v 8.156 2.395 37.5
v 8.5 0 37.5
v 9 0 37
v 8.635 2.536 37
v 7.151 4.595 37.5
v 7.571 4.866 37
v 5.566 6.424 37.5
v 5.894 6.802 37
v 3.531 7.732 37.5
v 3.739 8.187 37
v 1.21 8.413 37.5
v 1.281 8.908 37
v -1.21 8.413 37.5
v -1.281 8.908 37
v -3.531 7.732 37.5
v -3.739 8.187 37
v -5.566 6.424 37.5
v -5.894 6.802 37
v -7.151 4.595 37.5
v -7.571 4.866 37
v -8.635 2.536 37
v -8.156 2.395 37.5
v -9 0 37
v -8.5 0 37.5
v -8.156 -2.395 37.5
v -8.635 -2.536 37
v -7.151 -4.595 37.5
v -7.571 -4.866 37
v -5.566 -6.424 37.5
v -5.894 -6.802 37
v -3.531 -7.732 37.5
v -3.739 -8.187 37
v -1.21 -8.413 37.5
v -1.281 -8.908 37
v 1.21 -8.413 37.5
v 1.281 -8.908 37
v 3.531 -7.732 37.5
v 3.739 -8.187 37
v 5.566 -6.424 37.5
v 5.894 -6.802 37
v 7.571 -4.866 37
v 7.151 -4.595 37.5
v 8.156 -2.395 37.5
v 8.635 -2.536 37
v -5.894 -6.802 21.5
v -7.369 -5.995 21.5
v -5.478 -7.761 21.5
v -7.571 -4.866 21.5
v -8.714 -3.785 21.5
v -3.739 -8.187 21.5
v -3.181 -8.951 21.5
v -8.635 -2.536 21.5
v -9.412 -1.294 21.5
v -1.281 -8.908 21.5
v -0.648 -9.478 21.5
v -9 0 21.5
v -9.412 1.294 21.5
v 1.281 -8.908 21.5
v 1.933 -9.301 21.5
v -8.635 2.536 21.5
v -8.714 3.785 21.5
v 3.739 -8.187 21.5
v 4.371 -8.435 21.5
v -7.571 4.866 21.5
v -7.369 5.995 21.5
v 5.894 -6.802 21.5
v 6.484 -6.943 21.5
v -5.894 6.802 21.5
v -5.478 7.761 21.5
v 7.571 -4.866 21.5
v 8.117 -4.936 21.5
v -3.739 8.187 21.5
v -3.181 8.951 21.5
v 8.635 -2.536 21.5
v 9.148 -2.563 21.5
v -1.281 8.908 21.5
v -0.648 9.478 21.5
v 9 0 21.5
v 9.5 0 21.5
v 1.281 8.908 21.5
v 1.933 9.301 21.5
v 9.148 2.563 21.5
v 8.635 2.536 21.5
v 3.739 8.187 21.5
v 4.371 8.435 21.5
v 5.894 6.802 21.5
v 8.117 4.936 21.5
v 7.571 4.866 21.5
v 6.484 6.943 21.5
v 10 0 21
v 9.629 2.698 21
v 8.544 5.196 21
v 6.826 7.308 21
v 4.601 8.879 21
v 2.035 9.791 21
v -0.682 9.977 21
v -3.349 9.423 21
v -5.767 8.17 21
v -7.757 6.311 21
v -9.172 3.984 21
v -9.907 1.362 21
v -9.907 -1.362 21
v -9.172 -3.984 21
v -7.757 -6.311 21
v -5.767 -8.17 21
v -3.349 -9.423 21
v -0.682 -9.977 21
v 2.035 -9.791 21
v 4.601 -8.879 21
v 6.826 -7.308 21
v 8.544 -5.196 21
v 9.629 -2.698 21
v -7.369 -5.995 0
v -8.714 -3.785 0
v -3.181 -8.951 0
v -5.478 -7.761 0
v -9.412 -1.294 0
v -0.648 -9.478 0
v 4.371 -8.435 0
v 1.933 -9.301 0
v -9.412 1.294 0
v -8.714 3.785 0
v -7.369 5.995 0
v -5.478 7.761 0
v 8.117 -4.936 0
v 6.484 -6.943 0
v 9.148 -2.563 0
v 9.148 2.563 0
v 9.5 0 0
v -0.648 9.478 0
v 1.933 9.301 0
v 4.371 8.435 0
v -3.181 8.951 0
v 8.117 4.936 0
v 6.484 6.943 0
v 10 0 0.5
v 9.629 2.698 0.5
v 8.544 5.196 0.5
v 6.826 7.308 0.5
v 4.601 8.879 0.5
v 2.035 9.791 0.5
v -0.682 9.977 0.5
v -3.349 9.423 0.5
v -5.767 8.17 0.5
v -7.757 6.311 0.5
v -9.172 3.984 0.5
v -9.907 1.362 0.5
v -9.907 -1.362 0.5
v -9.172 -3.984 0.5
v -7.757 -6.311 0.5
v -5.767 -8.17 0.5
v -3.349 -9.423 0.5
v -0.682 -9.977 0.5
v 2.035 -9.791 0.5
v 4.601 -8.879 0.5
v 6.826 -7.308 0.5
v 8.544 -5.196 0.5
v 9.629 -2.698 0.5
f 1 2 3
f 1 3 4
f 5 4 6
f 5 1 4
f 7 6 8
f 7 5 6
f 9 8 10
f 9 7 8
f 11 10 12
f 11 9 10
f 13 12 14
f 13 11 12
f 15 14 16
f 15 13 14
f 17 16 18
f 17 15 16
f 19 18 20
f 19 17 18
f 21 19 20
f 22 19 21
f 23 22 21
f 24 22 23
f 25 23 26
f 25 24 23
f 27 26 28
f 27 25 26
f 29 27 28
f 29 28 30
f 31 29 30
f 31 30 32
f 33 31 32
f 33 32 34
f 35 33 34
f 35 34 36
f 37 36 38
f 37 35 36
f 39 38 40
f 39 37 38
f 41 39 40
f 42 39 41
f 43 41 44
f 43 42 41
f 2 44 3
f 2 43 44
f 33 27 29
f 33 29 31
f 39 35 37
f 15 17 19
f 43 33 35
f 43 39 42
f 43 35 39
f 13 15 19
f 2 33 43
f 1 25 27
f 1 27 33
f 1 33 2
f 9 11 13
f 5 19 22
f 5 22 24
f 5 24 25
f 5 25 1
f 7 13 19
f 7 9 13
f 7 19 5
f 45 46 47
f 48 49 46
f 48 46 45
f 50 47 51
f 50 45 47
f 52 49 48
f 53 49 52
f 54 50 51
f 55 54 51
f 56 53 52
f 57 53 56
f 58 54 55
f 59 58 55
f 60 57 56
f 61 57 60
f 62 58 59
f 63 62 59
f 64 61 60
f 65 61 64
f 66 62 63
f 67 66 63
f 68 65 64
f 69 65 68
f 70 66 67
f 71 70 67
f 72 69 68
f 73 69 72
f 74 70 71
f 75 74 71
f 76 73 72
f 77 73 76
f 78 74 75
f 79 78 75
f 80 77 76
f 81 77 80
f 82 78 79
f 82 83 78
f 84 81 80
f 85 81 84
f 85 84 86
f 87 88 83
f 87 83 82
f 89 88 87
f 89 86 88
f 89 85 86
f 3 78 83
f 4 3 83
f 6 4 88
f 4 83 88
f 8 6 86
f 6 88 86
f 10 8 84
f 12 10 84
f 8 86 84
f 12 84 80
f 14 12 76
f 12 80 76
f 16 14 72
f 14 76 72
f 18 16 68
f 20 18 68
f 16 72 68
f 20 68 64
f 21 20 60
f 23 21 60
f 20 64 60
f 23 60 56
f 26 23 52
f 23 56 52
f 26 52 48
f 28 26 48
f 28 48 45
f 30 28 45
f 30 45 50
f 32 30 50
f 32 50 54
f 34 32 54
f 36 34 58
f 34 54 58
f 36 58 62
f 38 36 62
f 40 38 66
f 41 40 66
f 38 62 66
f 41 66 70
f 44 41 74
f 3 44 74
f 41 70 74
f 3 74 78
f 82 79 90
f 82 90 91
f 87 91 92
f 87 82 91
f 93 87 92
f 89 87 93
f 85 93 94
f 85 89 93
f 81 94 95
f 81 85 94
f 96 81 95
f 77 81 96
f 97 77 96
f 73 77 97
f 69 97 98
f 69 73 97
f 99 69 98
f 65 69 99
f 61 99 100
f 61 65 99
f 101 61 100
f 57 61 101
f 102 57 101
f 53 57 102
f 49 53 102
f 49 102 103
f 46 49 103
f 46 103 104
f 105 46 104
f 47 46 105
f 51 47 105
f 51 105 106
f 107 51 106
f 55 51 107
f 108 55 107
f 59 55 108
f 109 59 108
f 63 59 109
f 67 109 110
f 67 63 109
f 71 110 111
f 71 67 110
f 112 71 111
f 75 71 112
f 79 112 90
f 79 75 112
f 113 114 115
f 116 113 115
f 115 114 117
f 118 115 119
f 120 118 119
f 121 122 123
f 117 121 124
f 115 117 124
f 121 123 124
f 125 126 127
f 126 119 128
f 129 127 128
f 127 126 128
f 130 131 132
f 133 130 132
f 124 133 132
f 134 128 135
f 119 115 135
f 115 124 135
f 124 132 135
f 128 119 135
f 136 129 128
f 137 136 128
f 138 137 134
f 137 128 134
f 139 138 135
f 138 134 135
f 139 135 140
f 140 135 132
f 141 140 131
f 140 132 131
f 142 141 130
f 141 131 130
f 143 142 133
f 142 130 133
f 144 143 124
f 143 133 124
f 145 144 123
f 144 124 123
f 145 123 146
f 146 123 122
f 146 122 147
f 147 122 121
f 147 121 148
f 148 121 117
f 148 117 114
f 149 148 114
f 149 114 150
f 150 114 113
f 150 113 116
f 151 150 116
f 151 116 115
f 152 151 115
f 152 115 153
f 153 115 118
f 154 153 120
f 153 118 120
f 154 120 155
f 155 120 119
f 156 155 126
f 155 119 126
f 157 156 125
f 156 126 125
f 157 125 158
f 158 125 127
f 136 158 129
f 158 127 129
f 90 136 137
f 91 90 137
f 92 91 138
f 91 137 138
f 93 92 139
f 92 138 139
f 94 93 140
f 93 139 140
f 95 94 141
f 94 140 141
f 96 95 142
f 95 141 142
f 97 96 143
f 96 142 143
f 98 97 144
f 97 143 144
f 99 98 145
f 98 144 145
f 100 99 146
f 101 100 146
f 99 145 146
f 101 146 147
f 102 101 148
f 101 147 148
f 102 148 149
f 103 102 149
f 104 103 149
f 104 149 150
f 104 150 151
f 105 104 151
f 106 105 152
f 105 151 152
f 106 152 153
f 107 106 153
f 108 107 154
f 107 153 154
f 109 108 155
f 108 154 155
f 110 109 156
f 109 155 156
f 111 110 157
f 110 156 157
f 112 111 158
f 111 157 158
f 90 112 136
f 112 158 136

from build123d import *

# Parameters (mm, degrees)
SKETCH_1_R      = 10
EXTRUDE_1_DEPTH = 21.5
SKETCH_2_R      = 9
EXTRUDE_2_DEPTH = 16
CHAMFER_1_SIZE  = 0.5


with BuildPart() as part:
    # 草图1 → 凸台-拉伸1 (new body)
    with BuildSketch(Plane.XY):
        Circle(SKETCH_1_R)
    extrude(amount=EXTRUDE_1_DEPTH)

    # 草图2 → 凸台-拉伸2 (add)
    with BuildSketch(Plane.XY.offset(21.5)):
        Circle(SKETCH_2_R)
    extrude(amount=EXTRUDE_2_DEPTH)

    # 倒角1
    chamfer_1_edges = [part.edges().sort_by_distance(p)[0] for p in [
        (-10, 0, 0),
        (-10, 0, 21.5),
        (-9, 0, 37.5),
    ]]
    chamfer(chamfer_1_edges, length=CHAMFER_1_SIZE)


solid = part.part
